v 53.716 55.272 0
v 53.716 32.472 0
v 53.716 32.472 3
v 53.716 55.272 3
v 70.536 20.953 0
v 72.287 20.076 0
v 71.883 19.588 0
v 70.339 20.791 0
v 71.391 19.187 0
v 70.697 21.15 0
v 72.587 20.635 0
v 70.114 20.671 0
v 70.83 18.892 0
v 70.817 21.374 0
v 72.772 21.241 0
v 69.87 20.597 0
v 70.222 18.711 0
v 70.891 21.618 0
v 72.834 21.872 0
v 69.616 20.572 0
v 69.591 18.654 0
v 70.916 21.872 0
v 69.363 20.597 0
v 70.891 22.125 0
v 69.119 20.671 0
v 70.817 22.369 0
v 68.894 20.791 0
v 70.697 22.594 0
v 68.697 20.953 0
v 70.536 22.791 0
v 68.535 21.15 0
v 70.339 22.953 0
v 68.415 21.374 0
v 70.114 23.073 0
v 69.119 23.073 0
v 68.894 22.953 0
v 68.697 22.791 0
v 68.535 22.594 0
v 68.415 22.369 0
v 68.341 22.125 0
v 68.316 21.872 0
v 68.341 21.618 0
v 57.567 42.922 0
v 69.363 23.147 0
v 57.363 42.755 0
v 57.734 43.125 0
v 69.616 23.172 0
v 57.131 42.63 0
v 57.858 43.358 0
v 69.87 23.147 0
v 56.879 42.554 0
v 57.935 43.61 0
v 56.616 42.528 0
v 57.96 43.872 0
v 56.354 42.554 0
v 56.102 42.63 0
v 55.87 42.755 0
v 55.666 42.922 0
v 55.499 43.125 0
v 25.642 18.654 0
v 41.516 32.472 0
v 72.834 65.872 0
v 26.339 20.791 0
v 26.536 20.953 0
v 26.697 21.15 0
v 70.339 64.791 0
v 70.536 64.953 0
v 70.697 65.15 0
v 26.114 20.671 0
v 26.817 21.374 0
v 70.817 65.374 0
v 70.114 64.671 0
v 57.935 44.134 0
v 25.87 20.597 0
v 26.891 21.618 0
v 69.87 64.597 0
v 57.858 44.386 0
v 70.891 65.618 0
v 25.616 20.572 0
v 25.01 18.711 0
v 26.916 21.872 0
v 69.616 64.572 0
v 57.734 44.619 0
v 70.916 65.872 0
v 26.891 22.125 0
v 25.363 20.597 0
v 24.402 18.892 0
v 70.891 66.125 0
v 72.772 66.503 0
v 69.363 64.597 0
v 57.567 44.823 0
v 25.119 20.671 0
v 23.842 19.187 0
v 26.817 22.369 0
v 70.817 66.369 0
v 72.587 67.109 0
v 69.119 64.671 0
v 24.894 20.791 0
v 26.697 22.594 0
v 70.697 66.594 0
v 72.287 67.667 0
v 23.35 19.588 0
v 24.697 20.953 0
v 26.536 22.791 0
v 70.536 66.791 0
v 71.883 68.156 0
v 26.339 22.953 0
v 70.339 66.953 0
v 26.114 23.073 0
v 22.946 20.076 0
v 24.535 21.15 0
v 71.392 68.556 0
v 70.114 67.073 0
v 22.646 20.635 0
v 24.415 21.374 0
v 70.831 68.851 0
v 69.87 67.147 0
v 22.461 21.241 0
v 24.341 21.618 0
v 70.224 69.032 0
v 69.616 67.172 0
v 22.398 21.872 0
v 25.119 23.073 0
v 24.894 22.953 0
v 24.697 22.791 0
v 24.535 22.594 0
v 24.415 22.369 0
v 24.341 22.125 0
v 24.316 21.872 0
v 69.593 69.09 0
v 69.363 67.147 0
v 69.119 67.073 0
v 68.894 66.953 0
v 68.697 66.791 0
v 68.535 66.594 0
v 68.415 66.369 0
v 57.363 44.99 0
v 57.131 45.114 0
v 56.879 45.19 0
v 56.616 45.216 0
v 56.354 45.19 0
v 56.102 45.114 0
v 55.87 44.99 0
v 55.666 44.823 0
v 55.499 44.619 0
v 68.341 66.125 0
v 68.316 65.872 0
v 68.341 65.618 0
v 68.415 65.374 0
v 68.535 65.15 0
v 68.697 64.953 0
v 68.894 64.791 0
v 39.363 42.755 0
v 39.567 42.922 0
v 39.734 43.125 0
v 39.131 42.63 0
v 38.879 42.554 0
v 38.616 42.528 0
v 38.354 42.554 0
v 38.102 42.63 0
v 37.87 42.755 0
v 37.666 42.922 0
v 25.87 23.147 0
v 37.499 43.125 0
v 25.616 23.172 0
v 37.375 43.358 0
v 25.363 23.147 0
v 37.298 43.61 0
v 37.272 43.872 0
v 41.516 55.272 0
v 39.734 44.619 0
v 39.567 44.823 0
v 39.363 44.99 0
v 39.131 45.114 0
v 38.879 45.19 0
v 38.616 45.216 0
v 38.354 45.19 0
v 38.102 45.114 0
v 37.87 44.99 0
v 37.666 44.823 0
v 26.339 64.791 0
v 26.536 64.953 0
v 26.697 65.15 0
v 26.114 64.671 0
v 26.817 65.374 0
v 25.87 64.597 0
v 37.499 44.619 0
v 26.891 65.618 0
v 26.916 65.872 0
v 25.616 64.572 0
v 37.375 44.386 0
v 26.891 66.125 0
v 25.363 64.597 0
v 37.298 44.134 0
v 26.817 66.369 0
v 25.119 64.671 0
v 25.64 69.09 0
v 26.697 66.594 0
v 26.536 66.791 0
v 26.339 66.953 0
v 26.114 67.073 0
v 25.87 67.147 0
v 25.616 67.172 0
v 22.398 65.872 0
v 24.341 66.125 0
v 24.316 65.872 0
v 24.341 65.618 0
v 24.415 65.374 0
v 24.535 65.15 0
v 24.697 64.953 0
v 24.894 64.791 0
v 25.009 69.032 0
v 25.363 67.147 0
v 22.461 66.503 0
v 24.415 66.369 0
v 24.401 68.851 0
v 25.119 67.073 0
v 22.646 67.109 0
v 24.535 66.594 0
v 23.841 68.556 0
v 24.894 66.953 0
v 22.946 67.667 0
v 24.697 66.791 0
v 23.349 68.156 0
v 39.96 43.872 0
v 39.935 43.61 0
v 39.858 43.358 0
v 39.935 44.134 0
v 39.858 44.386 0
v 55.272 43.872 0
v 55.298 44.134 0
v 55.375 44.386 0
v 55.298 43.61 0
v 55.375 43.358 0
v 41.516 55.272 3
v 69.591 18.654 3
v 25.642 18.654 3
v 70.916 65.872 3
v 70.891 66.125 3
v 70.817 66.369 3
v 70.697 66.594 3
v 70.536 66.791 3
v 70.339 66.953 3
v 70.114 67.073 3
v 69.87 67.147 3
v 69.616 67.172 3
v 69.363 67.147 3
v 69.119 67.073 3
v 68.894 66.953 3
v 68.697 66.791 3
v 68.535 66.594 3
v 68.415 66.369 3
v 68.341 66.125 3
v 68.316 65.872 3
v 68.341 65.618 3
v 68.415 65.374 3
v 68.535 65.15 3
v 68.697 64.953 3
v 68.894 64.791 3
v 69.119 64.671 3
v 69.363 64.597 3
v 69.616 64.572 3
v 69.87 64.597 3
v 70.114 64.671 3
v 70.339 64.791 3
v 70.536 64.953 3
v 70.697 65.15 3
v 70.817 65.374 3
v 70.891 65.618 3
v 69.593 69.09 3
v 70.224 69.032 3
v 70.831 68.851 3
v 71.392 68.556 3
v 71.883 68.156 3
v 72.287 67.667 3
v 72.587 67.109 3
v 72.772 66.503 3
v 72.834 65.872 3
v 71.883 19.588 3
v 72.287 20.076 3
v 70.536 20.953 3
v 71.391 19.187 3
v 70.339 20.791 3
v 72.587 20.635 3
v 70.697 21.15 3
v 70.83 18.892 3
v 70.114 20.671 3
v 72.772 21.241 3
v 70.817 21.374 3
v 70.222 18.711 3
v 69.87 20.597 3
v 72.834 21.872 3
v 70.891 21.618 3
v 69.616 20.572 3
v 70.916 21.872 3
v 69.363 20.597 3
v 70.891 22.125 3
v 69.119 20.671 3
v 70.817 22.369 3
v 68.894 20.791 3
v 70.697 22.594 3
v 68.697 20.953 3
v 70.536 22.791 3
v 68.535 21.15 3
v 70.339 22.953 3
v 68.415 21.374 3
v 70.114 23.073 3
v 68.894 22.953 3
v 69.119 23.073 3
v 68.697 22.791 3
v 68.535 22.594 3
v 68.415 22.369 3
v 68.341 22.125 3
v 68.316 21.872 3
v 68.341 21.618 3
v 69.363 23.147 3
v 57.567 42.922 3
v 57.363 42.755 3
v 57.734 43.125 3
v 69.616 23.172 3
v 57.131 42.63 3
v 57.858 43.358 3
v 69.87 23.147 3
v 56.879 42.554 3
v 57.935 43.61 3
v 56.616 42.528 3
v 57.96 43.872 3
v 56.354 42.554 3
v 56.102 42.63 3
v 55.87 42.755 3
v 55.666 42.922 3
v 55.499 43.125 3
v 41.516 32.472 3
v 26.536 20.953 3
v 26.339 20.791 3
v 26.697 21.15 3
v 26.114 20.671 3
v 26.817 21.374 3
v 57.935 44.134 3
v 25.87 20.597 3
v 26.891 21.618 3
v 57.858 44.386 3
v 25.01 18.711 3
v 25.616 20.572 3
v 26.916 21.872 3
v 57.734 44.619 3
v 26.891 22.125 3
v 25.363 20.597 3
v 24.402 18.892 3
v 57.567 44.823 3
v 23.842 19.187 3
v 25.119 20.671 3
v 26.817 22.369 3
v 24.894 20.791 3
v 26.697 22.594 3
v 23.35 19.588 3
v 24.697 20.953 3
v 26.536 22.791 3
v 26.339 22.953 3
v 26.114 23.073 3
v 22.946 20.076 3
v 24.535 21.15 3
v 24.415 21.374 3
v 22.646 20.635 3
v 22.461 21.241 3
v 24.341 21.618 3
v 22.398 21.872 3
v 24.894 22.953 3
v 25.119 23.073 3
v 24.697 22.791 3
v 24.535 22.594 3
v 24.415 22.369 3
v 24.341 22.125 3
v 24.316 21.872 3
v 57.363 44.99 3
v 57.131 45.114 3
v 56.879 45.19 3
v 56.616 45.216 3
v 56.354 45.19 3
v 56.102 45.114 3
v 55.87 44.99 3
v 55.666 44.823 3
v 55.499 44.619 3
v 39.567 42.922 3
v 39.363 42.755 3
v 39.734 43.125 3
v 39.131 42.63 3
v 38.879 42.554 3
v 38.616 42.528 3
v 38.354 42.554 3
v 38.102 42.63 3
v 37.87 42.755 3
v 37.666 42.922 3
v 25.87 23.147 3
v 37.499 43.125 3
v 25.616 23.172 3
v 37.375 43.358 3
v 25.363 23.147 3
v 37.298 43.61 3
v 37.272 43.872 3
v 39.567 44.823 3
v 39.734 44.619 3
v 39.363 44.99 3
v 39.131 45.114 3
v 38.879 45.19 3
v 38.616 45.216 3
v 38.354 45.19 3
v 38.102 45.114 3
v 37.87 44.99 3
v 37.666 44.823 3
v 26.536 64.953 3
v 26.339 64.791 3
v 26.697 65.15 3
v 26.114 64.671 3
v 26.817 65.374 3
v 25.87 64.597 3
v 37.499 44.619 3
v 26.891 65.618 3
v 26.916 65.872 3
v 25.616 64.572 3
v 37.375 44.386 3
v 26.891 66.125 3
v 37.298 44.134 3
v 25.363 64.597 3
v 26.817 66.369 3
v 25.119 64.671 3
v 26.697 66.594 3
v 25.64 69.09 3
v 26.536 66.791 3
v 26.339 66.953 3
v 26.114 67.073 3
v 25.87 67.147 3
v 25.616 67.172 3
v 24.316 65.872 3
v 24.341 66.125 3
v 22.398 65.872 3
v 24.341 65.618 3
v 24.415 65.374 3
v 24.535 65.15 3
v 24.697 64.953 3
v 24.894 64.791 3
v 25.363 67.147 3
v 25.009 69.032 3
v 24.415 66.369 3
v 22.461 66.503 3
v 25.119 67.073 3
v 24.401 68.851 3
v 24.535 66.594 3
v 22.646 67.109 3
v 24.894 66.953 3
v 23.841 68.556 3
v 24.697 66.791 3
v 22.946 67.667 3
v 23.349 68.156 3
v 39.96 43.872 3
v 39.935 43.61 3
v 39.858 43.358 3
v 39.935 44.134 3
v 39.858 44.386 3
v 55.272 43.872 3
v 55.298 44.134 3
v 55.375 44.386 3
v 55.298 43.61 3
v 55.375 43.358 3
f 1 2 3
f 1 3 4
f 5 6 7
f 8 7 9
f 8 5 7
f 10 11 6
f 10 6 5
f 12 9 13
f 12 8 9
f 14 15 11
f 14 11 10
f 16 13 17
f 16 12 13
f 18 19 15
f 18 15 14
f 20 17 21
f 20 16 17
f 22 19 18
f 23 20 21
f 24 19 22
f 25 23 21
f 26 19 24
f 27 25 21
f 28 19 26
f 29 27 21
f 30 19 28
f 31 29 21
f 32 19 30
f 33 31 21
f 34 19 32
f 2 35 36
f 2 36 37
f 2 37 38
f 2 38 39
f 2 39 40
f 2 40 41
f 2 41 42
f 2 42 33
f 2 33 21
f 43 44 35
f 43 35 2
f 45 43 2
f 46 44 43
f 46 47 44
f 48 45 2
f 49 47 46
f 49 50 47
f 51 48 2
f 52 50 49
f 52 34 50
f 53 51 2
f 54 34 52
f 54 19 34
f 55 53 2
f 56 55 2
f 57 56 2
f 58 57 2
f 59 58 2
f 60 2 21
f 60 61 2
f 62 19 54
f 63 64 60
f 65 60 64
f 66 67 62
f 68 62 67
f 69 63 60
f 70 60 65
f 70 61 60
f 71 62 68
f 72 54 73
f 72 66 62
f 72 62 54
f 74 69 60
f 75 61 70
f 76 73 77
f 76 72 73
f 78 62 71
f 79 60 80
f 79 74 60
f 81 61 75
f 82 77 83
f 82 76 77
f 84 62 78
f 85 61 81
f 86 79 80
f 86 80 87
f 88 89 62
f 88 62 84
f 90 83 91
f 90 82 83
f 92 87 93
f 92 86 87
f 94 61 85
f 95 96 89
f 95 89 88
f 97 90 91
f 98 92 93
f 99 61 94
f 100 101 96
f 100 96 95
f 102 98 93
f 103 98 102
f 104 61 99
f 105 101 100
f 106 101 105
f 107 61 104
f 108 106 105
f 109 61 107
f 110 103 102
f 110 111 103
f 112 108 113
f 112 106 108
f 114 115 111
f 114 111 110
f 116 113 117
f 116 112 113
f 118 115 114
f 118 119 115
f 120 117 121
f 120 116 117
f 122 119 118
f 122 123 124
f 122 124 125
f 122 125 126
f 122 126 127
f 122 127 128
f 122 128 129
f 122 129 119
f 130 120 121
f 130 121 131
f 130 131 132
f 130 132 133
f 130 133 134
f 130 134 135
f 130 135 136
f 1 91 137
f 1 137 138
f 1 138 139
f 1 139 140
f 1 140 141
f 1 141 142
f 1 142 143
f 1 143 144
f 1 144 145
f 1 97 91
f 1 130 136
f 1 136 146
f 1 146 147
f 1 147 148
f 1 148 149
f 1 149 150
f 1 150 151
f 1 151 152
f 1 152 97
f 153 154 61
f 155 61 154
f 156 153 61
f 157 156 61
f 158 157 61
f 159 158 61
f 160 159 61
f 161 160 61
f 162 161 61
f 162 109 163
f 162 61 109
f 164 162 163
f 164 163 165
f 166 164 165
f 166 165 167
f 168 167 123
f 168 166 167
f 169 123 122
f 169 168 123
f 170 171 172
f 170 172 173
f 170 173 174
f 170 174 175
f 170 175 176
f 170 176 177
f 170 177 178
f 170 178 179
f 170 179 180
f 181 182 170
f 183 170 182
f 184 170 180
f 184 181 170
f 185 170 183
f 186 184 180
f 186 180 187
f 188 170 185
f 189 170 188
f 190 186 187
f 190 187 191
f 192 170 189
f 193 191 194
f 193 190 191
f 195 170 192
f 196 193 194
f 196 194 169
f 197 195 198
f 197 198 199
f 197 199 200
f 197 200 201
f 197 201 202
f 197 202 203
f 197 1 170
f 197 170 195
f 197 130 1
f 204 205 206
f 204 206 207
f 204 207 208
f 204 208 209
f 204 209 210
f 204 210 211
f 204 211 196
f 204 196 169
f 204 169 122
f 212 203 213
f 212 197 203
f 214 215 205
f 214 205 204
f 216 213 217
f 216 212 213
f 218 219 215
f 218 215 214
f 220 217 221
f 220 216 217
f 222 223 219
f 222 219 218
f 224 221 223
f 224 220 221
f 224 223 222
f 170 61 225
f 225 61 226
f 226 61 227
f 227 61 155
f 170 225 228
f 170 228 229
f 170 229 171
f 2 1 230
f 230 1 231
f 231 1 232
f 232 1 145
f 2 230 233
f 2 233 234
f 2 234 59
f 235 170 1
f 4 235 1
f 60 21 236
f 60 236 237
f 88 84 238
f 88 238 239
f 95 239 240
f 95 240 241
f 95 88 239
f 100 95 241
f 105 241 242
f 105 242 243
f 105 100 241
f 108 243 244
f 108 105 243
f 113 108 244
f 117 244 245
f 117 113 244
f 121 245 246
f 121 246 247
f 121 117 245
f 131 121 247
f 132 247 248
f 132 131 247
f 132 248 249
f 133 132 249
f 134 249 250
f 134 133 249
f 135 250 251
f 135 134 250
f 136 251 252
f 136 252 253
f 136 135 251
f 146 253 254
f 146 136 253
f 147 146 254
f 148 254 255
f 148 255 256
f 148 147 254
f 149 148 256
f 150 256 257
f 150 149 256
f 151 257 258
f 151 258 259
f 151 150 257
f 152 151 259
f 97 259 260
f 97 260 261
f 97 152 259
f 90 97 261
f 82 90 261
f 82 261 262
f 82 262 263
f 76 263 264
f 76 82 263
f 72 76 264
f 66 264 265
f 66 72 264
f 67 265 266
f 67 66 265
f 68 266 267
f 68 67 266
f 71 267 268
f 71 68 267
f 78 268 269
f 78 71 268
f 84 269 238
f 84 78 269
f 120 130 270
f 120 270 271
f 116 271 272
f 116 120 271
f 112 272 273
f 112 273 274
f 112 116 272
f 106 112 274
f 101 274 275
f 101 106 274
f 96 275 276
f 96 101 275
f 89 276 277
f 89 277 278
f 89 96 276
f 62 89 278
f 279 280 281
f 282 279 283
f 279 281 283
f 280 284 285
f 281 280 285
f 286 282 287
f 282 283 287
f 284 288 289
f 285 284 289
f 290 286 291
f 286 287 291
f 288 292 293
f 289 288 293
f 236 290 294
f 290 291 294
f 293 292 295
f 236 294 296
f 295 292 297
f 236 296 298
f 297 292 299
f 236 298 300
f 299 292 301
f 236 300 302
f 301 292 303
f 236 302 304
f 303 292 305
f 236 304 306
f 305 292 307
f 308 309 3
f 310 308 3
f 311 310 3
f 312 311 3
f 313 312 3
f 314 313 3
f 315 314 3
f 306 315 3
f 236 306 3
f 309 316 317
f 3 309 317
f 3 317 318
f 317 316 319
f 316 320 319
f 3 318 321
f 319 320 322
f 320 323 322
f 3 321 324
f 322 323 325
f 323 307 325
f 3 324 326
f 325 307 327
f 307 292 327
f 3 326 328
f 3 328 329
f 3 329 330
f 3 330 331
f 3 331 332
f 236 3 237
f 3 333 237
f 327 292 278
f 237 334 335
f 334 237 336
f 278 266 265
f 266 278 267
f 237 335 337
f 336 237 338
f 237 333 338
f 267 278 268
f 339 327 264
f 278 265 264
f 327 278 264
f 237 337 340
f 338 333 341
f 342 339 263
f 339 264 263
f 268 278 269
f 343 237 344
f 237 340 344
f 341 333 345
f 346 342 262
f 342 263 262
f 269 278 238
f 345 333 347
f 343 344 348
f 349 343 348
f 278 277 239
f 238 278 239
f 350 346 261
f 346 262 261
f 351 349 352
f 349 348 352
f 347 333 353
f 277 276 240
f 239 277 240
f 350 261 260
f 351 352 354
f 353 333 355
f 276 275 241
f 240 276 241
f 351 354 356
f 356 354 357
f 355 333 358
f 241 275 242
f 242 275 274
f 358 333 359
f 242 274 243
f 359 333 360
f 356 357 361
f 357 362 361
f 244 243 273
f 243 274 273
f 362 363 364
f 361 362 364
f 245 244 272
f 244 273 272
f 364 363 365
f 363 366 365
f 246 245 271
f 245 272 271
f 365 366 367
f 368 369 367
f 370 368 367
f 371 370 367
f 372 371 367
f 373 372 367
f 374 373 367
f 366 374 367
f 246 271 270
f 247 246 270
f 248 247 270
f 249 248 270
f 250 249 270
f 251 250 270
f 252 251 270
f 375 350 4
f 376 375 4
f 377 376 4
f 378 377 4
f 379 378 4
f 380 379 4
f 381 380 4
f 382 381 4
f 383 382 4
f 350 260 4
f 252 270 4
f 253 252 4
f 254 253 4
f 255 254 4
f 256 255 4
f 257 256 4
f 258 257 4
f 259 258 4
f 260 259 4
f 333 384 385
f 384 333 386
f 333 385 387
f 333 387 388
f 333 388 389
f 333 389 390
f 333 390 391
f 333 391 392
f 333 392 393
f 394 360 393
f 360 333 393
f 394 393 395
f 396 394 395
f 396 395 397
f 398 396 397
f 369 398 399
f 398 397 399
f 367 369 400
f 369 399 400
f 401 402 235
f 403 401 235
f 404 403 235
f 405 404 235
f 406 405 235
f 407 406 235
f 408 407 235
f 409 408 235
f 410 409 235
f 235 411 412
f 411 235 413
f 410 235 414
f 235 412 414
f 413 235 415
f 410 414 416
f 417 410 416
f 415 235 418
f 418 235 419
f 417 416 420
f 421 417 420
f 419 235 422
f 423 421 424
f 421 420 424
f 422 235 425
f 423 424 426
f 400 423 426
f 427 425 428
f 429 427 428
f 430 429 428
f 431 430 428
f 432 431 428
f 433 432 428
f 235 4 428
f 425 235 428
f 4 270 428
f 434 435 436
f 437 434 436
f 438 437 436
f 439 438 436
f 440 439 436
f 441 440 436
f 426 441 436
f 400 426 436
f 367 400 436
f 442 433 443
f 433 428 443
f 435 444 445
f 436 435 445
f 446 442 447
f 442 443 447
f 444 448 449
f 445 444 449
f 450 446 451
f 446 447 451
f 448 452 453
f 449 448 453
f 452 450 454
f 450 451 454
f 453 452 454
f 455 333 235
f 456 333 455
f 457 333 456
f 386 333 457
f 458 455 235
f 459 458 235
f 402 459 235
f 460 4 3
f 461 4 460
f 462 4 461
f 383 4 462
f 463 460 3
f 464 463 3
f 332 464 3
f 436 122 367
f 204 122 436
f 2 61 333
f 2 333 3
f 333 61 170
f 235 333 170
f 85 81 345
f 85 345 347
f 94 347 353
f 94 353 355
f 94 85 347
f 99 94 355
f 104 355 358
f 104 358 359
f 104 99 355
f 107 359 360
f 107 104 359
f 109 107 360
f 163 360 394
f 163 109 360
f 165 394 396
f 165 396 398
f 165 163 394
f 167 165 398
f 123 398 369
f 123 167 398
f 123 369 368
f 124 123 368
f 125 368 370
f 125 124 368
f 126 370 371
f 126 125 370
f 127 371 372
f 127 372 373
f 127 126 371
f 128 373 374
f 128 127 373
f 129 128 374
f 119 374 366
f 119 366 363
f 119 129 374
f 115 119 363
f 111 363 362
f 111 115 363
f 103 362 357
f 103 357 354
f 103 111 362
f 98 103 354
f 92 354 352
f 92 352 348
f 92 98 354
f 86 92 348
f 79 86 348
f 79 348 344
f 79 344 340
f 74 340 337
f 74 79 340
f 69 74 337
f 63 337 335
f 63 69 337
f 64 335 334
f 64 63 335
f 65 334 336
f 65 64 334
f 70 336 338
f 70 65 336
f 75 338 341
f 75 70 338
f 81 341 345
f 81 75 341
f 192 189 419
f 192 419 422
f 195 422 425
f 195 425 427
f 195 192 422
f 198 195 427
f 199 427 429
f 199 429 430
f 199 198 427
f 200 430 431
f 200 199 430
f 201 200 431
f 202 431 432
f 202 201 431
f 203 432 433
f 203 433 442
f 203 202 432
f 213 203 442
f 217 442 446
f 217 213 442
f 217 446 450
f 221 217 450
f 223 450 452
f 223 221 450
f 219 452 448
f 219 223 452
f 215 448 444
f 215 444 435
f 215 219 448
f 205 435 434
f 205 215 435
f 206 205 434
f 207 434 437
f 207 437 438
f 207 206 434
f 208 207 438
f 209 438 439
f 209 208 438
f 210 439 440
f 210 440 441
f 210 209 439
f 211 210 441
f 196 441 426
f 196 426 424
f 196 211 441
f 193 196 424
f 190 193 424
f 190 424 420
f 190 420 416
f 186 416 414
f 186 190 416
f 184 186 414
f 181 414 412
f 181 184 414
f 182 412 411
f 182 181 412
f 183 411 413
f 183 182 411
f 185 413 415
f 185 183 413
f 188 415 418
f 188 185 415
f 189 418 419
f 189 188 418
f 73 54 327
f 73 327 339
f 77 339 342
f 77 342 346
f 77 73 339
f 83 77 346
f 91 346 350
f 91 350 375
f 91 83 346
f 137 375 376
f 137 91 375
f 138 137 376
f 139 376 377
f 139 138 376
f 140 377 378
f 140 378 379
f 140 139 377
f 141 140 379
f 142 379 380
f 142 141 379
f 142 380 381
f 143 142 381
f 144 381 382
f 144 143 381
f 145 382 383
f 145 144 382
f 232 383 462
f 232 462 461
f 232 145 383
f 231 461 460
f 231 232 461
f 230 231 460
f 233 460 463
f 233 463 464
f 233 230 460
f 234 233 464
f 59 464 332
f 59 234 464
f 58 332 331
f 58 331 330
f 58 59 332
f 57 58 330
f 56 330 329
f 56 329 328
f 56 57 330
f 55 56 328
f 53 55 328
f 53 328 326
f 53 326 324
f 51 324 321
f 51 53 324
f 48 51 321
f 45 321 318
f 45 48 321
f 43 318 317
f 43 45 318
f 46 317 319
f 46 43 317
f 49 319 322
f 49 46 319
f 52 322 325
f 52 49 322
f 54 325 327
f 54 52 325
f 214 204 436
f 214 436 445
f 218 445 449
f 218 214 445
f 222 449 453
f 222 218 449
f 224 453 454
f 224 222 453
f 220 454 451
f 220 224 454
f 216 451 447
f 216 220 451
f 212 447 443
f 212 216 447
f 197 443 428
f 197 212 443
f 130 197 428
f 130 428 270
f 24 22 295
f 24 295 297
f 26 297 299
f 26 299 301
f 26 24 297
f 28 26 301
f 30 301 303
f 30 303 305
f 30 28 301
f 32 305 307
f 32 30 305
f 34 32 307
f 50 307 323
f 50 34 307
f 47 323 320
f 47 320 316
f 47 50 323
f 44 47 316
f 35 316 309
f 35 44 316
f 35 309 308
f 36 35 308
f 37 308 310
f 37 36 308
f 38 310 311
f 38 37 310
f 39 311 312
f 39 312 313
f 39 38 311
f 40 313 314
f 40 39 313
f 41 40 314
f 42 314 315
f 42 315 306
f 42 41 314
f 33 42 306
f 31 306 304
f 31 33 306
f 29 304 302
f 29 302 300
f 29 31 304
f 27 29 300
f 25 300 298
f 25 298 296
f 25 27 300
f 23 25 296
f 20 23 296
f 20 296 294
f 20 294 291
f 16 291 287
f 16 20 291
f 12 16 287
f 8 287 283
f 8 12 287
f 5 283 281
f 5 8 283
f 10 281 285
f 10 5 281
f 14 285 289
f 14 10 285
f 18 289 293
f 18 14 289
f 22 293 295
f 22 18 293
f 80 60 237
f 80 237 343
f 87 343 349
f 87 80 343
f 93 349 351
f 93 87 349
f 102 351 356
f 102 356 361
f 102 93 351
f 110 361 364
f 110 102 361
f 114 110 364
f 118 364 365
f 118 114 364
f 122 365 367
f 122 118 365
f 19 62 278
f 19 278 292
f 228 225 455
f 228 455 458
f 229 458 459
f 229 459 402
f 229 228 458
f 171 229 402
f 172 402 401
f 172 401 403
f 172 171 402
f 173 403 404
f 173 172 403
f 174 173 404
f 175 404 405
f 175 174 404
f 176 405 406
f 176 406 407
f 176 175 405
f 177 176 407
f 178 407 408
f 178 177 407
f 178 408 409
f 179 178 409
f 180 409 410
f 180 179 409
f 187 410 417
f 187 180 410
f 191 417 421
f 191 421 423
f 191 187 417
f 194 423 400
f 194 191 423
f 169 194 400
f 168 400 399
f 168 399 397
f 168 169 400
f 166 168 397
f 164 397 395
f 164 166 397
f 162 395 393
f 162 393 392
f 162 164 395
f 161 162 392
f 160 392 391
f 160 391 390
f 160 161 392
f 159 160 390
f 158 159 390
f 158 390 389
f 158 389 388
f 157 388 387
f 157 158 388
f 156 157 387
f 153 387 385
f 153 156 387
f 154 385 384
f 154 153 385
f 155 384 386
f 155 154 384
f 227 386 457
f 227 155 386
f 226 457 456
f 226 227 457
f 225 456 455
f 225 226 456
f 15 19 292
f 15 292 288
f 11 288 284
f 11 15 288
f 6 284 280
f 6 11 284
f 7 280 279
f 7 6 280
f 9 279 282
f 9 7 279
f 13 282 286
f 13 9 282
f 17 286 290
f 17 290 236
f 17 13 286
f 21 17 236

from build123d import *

# Parameters (mm, degrees)
MODEL_R             = 1.3
MODEL_R_2           = 1.344067797
MODEL_W             = 12.2
MODEL_H             = 22.8
BOSS_EXTRUDE1_DEPTH = 3


with BuildPart() as part:
    # Model → Boss-Extrude1 (new body)
    with BuildSketch(Plane.XY):
        with BuildLine():
            Line((25.639766947, 69.089607729), (69.59281779, 69.089607729))
            ThreePointArc((69.59281779, 69.089607729), (71.883249375, 68.155605213), (72.834203695, 65.872159696))
            Line((72.834203695, 65.872159696), (72.834203695, 21.872118121))
            ThreePointArc((72.834203695, 21.872118121), (71.882847983, 19.587552286), (69.590964861, 18.653962174))
            Line((69.590964861, 18.653962174), (25.641619876, 18.653962174))
            ThreePointArc((25.641619876, 18.653962174), (23.349724106, 19.587556709), (22.398372881, 21.872138909))
            Line((22.398372881, 21.872138909), (22.398372881, 65.872138909))
            ThreePointArc((22.398372881, 65.872138909), (23.349322718, 68.155600786), (25.639766947, 69.089607729))
        make_face()
        with Locations((25.616288319, 65.871777925)):
            Circle(MODEL_R, mode=Mode.SUBTRACT)
        with Locations((69.616288319, 65.871777925)):
            Circle(MODEL_R, mode=Mode.SUBTRACT)
        with Locations((56.616292368, 43.872138909)):
            Circle(MODEL_R_2, mode=Mode.SUBTRACT)
        with Locations((38.616292368, 43.872138909)):
            Circle(MODEL_R_2, mode=Mode.SUBTRACT)
        with Locations((25.616288319, 21.871777925)):
            Circle(MODEL_R, mode=Mode.SUBTRACT)
        with Locations((69.616288319, 21.871777925)):
            Circle(MODEL_R, mode=Mode.SUBTRACT)
        with Locations((47.616292368, 43.872138909)):
            Rectangle(MODEL_W, MODEL_H, mode=Mode.SUBTRACT)
    extrude(amount=BOSS_EXTRUDE1_DEPTH)


solid = part.part
